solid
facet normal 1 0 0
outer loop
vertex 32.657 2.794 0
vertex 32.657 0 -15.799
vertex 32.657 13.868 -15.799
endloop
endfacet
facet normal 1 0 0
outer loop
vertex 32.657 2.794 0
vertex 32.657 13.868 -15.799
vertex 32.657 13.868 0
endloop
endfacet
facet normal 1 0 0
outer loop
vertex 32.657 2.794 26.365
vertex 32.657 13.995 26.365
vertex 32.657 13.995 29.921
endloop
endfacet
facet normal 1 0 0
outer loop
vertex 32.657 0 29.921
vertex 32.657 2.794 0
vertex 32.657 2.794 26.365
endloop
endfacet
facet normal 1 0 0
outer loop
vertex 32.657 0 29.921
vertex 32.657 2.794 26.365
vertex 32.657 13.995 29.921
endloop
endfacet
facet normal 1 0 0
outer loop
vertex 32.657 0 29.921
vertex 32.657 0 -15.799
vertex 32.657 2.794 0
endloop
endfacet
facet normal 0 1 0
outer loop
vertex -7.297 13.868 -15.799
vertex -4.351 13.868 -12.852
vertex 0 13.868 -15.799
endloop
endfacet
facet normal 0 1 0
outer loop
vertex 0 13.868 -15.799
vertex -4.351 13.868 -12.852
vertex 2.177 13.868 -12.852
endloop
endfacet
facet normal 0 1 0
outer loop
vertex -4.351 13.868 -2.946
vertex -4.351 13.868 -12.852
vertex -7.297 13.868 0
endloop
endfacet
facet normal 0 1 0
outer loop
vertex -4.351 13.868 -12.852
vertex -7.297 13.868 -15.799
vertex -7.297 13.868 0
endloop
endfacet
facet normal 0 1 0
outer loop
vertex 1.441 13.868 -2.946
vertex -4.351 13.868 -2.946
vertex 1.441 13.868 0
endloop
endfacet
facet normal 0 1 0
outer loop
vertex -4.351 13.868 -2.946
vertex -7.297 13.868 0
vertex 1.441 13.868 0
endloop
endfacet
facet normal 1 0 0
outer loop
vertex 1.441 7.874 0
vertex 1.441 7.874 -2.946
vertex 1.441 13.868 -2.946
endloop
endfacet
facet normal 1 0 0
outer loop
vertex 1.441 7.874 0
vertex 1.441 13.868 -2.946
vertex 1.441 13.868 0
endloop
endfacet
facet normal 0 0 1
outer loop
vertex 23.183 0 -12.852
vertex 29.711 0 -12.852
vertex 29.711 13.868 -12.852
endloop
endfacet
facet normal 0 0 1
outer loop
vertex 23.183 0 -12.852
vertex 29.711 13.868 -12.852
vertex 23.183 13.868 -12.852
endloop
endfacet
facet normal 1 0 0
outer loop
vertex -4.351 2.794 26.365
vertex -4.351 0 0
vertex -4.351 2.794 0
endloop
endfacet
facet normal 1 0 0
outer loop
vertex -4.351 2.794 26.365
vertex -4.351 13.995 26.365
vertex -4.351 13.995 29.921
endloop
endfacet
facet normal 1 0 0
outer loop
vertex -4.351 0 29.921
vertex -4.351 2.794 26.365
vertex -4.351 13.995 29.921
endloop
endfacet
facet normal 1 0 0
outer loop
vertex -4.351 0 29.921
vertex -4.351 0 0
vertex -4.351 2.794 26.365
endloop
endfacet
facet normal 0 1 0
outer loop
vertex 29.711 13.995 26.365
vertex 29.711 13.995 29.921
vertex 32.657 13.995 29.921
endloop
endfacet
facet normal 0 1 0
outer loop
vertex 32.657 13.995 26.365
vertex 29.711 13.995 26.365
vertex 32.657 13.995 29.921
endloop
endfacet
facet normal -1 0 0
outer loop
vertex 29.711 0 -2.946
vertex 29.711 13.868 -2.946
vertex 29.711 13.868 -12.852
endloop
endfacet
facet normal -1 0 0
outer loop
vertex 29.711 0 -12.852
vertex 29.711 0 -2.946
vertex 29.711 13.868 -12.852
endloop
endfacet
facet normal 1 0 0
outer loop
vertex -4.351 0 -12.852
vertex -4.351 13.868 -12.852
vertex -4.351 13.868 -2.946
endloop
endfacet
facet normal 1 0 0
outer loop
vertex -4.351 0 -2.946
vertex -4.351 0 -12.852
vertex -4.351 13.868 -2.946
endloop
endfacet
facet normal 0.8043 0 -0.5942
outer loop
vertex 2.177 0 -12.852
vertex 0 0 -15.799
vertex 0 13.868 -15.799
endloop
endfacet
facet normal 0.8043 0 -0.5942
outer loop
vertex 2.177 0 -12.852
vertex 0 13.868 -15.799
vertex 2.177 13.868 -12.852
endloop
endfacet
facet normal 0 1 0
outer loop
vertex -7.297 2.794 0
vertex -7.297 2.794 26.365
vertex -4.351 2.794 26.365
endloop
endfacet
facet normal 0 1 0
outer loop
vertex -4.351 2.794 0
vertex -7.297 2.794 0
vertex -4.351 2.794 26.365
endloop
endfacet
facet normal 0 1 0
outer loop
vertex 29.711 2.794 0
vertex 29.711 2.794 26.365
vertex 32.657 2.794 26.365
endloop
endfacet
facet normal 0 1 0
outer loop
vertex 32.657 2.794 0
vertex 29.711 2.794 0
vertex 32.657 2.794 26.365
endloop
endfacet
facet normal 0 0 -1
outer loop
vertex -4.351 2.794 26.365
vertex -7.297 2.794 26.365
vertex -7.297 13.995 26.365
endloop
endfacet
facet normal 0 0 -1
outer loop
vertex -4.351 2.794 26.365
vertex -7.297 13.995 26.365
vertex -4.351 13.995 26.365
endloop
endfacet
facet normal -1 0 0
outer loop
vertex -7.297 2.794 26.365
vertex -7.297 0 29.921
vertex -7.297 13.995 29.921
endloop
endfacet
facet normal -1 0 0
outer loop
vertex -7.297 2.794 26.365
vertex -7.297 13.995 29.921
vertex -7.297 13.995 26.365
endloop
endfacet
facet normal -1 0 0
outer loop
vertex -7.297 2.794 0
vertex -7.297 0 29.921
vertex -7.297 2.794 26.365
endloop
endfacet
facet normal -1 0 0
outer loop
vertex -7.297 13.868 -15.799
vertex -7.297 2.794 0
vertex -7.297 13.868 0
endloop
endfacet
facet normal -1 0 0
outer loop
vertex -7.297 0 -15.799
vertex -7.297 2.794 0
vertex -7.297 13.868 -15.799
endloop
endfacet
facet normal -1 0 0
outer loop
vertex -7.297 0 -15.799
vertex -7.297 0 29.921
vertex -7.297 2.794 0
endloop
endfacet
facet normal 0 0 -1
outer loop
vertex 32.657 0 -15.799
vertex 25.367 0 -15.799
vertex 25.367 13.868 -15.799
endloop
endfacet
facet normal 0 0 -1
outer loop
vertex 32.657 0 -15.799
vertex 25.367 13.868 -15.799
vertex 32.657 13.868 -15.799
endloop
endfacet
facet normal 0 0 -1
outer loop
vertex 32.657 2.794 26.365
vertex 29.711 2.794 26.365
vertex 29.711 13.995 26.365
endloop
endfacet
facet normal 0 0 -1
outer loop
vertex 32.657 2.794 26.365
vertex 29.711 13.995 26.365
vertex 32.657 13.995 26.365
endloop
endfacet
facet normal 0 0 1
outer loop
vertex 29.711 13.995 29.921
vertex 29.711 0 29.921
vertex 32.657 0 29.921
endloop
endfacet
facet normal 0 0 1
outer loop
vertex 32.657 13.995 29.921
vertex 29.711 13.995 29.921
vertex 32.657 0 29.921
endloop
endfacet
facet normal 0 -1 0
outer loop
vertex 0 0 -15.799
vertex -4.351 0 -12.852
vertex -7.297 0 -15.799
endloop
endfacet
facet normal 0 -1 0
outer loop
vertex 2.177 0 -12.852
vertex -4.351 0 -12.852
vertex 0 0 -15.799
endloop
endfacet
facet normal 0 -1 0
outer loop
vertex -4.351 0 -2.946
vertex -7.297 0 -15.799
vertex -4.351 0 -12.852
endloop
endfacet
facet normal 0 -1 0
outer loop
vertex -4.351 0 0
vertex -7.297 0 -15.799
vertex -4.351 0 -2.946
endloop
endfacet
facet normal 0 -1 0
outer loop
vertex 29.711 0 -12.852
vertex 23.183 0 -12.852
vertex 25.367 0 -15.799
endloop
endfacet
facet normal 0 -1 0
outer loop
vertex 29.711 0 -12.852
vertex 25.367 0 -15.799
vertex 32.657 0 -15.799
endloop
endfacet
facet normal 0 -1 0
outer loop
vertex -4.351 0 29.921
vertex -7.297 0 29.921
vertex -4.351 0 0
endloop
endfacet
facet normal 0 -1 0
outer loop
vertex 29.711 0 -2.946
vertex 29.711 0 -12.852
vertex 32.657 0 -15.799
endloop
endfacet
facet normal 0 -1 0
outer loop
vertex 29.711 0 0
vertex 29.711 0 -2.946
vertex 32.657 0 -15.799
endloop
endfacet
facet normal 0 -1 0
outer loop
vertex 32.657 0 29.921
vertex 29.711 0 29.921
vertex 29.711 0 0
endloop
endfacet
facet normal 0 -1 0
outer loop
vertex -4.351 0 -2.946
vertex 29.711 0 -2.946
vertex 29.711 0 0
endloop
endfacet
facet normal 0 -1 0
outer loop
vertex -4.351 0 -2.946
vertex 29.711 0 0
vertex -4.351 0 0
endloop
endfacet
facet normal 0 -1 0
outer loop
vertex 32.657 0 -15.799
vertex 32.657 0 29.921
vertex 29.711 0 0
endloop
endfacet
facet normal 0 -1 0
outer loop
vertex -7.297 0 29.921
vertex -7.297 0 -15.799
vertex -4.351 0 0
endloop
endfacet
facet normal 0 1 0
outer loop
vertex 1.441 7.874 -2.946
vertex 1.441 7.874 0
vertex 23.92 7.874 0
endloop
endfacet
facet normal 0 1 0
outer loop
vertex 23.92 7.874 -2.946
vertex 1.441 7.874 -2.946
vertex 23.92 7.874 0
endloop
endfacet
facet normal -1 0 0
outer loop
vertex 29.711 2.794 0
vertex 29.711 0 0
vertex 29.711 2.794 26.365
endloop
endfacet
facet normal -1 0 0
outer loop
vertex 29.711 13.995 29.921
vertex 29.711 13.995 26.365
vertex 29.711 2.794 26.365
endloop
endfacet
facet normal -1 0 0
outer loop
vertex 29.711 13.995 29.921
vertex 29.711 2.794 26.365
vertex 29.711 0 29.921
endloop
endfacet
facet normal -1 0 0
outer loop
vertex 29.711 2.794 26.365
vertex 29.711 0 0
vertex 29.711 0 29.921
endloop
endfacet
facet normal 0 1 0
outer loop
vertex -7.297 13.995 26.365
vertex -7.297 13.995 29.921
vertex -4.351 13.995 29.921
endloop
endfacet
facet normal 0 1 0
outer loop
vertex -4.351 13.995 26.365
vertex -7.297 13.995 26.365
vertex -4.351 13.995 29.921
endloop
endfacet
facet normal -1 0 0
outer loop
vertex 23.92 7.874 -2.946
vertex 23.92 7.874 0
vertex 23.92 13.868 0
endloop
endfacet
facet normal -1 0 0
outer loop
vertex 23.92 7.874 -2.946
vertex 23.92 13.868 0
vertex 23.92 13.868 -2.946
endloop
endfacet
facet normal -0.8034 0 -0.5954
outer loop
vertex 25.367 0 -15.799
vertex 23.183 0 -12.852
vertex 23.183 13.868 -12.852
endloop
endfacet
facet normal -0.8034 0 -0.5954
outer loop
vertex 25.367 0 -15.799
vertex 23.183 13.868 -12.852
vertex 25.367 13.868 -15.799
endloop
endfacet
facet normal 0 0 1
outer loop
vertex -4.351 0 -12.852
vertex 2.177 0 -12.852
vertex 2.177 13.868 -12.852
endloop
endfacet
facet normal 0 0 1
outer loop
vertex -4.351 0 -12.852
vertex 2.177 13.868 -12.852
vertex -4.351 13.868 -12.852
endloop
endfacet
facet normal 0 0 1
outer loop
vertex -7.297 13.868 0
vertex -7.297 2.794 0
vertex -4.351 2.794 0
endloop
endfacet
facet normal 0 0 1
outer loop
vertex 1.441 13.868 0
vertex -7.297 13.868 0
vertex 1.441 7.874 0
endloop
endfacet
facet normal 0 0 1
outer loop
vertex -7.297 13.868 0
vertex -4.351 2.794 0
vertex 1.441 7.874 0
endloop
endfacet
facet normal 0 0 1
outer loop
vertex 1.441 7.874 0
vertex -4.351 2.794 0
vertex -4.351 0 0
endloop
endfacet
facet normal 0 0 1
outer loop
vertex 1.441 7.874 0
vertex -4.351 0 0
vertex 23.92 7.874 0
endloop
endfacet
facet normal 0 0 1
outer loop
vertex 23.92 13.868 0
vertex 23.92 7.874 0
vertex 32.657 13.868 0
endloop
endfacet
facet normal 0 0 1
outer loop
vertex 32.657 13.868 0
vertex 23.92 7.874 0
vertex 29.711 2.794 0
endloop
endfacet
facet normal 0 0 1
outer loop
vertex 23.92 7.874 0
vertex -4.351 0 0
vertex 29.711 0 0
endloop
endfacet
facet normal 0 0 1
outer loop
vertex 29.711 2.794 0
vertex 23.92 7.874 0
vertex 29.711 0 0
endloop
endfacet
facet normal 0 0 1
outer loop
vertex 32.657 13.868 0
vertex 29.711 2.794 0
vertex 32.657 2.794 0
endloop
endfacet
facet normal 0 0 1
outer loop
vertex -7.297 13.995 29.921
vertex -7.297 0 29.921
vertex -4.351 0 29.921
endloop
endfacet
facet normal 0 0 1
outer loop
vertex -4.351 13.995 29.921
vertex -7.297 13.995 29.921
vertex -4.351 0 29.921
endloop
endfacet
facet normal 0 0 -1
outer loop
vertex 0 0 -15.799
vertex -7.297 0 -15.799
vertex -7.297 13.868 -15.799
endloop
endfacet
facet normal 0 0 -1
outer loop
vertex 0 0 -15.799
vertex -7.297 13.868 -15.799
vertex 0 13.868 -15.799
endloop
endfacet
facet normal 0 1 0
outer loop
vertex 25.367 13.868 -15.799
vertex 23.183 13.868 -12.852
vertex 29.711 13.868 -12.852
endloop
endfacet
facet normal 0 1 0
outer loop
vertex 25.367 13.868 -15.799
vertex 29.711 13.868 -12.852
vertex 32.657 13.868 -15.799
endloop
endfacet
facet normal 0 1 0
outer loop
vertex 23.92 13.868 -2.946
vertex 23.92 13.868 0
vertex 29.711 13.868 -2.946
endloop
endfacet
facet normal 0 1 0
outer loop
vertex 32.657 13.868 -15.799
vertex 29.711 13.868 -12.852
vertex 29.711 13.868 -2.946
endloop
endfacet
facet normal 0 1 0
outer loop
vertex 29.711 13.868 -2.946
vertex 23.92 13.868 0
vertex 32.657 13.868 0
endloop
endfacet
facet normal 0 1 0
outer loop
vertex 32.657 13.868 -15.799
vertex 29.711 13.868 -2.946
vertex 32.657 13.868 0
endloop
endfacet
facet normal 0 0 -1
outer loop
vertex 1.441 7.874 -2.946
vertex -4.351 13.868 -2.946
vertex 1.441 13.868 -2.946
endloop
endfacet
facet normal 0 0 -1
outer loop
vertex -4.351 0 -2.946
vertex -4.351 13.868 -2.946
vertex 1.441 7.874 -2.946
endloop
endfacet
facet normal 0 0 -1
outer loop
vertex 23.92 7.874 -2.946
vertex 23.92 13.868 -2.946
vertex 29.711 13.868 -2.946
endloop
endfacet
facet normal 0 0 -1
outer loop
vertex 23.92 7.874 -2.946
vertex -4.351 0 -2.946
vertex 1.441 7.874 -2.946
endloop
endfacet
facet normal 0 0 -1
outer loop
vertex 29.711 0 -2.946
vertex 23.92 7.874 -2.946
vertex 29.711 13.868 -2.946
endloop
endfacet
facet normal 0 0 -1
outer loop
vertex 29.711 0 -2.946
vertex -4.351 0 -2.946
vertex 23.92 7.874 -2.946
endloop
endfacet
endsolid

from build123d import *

# Parameters (mm, degrees)
F0_W     = 2.9464
F0_H     = 3.556
F1_DEPTH = 13.9954
F0_H_2   = 26.3652
F2_DEPTH = 2.794
F3_DEPTH = 13.8684
F0_W_2   = 22.479
F0_H_3   = 2.9464
F4_DEPTH = 7.874


with BuildPart() as f1:
    # F0 (on Front) → F1 (new body)
    with BuildSketch(Plane.XZ):
        with Locations((-5.823712, 28.1432)):
            Rectangle(F0_W, F0_H)
        with Locations((31.184088, 28.1432)):
            Rectangle(F0_W, F0_H)
    extrude(amount=-F1_DEPTH)

    # F0 (on Front) → F2 (join)
    with BuildSketch(Plane.XZ):
        with Locations((-5.823712, 13.1826)):
            Rectangle(F0_W, F0_H_2)
        with Locations((31.184088, 13.1826)):
            Rectangle(F0_W, F0_H_2)
    extrude(amount=-F2_DEPTH)

    # F0 (on Front) → F3 (join)
    with BuildSketch(Plane.XZ):
        Polygon((32.657288, -15.7988), (32.657288, 0), (29.710888, 0), (23.919688, 0), (23.919688, -2.9464), (29.710888, -2.9464), (29.710888, -12.8524), (23.183088, -12.8524), (25.367488, -15.7988), (29.710888, -15.7988), align=None)
        Polygon((1.440688, -2.9464), (1.440688, 0), (-4.350512, 0), (-7.296912, 0), (-7.296912, -15.7988), (-4.350512, -15.7988), (0, -15.7988), (2.177288, -12.8524), (-4.350512, -12.8524), (-4.350512, -2.9464), align=None)
    extrude(amount=-F3_DEPTH)

    # F0 (on Front) → F4 (join)
    with BuildSketch(Plane.XZ):
        with Locations((12.680188, -1.4732)):
            Rectangle(F0_W_2, F0_H_3)
    extrude(amount=-F4_DEPTH)


solid = f1.part
